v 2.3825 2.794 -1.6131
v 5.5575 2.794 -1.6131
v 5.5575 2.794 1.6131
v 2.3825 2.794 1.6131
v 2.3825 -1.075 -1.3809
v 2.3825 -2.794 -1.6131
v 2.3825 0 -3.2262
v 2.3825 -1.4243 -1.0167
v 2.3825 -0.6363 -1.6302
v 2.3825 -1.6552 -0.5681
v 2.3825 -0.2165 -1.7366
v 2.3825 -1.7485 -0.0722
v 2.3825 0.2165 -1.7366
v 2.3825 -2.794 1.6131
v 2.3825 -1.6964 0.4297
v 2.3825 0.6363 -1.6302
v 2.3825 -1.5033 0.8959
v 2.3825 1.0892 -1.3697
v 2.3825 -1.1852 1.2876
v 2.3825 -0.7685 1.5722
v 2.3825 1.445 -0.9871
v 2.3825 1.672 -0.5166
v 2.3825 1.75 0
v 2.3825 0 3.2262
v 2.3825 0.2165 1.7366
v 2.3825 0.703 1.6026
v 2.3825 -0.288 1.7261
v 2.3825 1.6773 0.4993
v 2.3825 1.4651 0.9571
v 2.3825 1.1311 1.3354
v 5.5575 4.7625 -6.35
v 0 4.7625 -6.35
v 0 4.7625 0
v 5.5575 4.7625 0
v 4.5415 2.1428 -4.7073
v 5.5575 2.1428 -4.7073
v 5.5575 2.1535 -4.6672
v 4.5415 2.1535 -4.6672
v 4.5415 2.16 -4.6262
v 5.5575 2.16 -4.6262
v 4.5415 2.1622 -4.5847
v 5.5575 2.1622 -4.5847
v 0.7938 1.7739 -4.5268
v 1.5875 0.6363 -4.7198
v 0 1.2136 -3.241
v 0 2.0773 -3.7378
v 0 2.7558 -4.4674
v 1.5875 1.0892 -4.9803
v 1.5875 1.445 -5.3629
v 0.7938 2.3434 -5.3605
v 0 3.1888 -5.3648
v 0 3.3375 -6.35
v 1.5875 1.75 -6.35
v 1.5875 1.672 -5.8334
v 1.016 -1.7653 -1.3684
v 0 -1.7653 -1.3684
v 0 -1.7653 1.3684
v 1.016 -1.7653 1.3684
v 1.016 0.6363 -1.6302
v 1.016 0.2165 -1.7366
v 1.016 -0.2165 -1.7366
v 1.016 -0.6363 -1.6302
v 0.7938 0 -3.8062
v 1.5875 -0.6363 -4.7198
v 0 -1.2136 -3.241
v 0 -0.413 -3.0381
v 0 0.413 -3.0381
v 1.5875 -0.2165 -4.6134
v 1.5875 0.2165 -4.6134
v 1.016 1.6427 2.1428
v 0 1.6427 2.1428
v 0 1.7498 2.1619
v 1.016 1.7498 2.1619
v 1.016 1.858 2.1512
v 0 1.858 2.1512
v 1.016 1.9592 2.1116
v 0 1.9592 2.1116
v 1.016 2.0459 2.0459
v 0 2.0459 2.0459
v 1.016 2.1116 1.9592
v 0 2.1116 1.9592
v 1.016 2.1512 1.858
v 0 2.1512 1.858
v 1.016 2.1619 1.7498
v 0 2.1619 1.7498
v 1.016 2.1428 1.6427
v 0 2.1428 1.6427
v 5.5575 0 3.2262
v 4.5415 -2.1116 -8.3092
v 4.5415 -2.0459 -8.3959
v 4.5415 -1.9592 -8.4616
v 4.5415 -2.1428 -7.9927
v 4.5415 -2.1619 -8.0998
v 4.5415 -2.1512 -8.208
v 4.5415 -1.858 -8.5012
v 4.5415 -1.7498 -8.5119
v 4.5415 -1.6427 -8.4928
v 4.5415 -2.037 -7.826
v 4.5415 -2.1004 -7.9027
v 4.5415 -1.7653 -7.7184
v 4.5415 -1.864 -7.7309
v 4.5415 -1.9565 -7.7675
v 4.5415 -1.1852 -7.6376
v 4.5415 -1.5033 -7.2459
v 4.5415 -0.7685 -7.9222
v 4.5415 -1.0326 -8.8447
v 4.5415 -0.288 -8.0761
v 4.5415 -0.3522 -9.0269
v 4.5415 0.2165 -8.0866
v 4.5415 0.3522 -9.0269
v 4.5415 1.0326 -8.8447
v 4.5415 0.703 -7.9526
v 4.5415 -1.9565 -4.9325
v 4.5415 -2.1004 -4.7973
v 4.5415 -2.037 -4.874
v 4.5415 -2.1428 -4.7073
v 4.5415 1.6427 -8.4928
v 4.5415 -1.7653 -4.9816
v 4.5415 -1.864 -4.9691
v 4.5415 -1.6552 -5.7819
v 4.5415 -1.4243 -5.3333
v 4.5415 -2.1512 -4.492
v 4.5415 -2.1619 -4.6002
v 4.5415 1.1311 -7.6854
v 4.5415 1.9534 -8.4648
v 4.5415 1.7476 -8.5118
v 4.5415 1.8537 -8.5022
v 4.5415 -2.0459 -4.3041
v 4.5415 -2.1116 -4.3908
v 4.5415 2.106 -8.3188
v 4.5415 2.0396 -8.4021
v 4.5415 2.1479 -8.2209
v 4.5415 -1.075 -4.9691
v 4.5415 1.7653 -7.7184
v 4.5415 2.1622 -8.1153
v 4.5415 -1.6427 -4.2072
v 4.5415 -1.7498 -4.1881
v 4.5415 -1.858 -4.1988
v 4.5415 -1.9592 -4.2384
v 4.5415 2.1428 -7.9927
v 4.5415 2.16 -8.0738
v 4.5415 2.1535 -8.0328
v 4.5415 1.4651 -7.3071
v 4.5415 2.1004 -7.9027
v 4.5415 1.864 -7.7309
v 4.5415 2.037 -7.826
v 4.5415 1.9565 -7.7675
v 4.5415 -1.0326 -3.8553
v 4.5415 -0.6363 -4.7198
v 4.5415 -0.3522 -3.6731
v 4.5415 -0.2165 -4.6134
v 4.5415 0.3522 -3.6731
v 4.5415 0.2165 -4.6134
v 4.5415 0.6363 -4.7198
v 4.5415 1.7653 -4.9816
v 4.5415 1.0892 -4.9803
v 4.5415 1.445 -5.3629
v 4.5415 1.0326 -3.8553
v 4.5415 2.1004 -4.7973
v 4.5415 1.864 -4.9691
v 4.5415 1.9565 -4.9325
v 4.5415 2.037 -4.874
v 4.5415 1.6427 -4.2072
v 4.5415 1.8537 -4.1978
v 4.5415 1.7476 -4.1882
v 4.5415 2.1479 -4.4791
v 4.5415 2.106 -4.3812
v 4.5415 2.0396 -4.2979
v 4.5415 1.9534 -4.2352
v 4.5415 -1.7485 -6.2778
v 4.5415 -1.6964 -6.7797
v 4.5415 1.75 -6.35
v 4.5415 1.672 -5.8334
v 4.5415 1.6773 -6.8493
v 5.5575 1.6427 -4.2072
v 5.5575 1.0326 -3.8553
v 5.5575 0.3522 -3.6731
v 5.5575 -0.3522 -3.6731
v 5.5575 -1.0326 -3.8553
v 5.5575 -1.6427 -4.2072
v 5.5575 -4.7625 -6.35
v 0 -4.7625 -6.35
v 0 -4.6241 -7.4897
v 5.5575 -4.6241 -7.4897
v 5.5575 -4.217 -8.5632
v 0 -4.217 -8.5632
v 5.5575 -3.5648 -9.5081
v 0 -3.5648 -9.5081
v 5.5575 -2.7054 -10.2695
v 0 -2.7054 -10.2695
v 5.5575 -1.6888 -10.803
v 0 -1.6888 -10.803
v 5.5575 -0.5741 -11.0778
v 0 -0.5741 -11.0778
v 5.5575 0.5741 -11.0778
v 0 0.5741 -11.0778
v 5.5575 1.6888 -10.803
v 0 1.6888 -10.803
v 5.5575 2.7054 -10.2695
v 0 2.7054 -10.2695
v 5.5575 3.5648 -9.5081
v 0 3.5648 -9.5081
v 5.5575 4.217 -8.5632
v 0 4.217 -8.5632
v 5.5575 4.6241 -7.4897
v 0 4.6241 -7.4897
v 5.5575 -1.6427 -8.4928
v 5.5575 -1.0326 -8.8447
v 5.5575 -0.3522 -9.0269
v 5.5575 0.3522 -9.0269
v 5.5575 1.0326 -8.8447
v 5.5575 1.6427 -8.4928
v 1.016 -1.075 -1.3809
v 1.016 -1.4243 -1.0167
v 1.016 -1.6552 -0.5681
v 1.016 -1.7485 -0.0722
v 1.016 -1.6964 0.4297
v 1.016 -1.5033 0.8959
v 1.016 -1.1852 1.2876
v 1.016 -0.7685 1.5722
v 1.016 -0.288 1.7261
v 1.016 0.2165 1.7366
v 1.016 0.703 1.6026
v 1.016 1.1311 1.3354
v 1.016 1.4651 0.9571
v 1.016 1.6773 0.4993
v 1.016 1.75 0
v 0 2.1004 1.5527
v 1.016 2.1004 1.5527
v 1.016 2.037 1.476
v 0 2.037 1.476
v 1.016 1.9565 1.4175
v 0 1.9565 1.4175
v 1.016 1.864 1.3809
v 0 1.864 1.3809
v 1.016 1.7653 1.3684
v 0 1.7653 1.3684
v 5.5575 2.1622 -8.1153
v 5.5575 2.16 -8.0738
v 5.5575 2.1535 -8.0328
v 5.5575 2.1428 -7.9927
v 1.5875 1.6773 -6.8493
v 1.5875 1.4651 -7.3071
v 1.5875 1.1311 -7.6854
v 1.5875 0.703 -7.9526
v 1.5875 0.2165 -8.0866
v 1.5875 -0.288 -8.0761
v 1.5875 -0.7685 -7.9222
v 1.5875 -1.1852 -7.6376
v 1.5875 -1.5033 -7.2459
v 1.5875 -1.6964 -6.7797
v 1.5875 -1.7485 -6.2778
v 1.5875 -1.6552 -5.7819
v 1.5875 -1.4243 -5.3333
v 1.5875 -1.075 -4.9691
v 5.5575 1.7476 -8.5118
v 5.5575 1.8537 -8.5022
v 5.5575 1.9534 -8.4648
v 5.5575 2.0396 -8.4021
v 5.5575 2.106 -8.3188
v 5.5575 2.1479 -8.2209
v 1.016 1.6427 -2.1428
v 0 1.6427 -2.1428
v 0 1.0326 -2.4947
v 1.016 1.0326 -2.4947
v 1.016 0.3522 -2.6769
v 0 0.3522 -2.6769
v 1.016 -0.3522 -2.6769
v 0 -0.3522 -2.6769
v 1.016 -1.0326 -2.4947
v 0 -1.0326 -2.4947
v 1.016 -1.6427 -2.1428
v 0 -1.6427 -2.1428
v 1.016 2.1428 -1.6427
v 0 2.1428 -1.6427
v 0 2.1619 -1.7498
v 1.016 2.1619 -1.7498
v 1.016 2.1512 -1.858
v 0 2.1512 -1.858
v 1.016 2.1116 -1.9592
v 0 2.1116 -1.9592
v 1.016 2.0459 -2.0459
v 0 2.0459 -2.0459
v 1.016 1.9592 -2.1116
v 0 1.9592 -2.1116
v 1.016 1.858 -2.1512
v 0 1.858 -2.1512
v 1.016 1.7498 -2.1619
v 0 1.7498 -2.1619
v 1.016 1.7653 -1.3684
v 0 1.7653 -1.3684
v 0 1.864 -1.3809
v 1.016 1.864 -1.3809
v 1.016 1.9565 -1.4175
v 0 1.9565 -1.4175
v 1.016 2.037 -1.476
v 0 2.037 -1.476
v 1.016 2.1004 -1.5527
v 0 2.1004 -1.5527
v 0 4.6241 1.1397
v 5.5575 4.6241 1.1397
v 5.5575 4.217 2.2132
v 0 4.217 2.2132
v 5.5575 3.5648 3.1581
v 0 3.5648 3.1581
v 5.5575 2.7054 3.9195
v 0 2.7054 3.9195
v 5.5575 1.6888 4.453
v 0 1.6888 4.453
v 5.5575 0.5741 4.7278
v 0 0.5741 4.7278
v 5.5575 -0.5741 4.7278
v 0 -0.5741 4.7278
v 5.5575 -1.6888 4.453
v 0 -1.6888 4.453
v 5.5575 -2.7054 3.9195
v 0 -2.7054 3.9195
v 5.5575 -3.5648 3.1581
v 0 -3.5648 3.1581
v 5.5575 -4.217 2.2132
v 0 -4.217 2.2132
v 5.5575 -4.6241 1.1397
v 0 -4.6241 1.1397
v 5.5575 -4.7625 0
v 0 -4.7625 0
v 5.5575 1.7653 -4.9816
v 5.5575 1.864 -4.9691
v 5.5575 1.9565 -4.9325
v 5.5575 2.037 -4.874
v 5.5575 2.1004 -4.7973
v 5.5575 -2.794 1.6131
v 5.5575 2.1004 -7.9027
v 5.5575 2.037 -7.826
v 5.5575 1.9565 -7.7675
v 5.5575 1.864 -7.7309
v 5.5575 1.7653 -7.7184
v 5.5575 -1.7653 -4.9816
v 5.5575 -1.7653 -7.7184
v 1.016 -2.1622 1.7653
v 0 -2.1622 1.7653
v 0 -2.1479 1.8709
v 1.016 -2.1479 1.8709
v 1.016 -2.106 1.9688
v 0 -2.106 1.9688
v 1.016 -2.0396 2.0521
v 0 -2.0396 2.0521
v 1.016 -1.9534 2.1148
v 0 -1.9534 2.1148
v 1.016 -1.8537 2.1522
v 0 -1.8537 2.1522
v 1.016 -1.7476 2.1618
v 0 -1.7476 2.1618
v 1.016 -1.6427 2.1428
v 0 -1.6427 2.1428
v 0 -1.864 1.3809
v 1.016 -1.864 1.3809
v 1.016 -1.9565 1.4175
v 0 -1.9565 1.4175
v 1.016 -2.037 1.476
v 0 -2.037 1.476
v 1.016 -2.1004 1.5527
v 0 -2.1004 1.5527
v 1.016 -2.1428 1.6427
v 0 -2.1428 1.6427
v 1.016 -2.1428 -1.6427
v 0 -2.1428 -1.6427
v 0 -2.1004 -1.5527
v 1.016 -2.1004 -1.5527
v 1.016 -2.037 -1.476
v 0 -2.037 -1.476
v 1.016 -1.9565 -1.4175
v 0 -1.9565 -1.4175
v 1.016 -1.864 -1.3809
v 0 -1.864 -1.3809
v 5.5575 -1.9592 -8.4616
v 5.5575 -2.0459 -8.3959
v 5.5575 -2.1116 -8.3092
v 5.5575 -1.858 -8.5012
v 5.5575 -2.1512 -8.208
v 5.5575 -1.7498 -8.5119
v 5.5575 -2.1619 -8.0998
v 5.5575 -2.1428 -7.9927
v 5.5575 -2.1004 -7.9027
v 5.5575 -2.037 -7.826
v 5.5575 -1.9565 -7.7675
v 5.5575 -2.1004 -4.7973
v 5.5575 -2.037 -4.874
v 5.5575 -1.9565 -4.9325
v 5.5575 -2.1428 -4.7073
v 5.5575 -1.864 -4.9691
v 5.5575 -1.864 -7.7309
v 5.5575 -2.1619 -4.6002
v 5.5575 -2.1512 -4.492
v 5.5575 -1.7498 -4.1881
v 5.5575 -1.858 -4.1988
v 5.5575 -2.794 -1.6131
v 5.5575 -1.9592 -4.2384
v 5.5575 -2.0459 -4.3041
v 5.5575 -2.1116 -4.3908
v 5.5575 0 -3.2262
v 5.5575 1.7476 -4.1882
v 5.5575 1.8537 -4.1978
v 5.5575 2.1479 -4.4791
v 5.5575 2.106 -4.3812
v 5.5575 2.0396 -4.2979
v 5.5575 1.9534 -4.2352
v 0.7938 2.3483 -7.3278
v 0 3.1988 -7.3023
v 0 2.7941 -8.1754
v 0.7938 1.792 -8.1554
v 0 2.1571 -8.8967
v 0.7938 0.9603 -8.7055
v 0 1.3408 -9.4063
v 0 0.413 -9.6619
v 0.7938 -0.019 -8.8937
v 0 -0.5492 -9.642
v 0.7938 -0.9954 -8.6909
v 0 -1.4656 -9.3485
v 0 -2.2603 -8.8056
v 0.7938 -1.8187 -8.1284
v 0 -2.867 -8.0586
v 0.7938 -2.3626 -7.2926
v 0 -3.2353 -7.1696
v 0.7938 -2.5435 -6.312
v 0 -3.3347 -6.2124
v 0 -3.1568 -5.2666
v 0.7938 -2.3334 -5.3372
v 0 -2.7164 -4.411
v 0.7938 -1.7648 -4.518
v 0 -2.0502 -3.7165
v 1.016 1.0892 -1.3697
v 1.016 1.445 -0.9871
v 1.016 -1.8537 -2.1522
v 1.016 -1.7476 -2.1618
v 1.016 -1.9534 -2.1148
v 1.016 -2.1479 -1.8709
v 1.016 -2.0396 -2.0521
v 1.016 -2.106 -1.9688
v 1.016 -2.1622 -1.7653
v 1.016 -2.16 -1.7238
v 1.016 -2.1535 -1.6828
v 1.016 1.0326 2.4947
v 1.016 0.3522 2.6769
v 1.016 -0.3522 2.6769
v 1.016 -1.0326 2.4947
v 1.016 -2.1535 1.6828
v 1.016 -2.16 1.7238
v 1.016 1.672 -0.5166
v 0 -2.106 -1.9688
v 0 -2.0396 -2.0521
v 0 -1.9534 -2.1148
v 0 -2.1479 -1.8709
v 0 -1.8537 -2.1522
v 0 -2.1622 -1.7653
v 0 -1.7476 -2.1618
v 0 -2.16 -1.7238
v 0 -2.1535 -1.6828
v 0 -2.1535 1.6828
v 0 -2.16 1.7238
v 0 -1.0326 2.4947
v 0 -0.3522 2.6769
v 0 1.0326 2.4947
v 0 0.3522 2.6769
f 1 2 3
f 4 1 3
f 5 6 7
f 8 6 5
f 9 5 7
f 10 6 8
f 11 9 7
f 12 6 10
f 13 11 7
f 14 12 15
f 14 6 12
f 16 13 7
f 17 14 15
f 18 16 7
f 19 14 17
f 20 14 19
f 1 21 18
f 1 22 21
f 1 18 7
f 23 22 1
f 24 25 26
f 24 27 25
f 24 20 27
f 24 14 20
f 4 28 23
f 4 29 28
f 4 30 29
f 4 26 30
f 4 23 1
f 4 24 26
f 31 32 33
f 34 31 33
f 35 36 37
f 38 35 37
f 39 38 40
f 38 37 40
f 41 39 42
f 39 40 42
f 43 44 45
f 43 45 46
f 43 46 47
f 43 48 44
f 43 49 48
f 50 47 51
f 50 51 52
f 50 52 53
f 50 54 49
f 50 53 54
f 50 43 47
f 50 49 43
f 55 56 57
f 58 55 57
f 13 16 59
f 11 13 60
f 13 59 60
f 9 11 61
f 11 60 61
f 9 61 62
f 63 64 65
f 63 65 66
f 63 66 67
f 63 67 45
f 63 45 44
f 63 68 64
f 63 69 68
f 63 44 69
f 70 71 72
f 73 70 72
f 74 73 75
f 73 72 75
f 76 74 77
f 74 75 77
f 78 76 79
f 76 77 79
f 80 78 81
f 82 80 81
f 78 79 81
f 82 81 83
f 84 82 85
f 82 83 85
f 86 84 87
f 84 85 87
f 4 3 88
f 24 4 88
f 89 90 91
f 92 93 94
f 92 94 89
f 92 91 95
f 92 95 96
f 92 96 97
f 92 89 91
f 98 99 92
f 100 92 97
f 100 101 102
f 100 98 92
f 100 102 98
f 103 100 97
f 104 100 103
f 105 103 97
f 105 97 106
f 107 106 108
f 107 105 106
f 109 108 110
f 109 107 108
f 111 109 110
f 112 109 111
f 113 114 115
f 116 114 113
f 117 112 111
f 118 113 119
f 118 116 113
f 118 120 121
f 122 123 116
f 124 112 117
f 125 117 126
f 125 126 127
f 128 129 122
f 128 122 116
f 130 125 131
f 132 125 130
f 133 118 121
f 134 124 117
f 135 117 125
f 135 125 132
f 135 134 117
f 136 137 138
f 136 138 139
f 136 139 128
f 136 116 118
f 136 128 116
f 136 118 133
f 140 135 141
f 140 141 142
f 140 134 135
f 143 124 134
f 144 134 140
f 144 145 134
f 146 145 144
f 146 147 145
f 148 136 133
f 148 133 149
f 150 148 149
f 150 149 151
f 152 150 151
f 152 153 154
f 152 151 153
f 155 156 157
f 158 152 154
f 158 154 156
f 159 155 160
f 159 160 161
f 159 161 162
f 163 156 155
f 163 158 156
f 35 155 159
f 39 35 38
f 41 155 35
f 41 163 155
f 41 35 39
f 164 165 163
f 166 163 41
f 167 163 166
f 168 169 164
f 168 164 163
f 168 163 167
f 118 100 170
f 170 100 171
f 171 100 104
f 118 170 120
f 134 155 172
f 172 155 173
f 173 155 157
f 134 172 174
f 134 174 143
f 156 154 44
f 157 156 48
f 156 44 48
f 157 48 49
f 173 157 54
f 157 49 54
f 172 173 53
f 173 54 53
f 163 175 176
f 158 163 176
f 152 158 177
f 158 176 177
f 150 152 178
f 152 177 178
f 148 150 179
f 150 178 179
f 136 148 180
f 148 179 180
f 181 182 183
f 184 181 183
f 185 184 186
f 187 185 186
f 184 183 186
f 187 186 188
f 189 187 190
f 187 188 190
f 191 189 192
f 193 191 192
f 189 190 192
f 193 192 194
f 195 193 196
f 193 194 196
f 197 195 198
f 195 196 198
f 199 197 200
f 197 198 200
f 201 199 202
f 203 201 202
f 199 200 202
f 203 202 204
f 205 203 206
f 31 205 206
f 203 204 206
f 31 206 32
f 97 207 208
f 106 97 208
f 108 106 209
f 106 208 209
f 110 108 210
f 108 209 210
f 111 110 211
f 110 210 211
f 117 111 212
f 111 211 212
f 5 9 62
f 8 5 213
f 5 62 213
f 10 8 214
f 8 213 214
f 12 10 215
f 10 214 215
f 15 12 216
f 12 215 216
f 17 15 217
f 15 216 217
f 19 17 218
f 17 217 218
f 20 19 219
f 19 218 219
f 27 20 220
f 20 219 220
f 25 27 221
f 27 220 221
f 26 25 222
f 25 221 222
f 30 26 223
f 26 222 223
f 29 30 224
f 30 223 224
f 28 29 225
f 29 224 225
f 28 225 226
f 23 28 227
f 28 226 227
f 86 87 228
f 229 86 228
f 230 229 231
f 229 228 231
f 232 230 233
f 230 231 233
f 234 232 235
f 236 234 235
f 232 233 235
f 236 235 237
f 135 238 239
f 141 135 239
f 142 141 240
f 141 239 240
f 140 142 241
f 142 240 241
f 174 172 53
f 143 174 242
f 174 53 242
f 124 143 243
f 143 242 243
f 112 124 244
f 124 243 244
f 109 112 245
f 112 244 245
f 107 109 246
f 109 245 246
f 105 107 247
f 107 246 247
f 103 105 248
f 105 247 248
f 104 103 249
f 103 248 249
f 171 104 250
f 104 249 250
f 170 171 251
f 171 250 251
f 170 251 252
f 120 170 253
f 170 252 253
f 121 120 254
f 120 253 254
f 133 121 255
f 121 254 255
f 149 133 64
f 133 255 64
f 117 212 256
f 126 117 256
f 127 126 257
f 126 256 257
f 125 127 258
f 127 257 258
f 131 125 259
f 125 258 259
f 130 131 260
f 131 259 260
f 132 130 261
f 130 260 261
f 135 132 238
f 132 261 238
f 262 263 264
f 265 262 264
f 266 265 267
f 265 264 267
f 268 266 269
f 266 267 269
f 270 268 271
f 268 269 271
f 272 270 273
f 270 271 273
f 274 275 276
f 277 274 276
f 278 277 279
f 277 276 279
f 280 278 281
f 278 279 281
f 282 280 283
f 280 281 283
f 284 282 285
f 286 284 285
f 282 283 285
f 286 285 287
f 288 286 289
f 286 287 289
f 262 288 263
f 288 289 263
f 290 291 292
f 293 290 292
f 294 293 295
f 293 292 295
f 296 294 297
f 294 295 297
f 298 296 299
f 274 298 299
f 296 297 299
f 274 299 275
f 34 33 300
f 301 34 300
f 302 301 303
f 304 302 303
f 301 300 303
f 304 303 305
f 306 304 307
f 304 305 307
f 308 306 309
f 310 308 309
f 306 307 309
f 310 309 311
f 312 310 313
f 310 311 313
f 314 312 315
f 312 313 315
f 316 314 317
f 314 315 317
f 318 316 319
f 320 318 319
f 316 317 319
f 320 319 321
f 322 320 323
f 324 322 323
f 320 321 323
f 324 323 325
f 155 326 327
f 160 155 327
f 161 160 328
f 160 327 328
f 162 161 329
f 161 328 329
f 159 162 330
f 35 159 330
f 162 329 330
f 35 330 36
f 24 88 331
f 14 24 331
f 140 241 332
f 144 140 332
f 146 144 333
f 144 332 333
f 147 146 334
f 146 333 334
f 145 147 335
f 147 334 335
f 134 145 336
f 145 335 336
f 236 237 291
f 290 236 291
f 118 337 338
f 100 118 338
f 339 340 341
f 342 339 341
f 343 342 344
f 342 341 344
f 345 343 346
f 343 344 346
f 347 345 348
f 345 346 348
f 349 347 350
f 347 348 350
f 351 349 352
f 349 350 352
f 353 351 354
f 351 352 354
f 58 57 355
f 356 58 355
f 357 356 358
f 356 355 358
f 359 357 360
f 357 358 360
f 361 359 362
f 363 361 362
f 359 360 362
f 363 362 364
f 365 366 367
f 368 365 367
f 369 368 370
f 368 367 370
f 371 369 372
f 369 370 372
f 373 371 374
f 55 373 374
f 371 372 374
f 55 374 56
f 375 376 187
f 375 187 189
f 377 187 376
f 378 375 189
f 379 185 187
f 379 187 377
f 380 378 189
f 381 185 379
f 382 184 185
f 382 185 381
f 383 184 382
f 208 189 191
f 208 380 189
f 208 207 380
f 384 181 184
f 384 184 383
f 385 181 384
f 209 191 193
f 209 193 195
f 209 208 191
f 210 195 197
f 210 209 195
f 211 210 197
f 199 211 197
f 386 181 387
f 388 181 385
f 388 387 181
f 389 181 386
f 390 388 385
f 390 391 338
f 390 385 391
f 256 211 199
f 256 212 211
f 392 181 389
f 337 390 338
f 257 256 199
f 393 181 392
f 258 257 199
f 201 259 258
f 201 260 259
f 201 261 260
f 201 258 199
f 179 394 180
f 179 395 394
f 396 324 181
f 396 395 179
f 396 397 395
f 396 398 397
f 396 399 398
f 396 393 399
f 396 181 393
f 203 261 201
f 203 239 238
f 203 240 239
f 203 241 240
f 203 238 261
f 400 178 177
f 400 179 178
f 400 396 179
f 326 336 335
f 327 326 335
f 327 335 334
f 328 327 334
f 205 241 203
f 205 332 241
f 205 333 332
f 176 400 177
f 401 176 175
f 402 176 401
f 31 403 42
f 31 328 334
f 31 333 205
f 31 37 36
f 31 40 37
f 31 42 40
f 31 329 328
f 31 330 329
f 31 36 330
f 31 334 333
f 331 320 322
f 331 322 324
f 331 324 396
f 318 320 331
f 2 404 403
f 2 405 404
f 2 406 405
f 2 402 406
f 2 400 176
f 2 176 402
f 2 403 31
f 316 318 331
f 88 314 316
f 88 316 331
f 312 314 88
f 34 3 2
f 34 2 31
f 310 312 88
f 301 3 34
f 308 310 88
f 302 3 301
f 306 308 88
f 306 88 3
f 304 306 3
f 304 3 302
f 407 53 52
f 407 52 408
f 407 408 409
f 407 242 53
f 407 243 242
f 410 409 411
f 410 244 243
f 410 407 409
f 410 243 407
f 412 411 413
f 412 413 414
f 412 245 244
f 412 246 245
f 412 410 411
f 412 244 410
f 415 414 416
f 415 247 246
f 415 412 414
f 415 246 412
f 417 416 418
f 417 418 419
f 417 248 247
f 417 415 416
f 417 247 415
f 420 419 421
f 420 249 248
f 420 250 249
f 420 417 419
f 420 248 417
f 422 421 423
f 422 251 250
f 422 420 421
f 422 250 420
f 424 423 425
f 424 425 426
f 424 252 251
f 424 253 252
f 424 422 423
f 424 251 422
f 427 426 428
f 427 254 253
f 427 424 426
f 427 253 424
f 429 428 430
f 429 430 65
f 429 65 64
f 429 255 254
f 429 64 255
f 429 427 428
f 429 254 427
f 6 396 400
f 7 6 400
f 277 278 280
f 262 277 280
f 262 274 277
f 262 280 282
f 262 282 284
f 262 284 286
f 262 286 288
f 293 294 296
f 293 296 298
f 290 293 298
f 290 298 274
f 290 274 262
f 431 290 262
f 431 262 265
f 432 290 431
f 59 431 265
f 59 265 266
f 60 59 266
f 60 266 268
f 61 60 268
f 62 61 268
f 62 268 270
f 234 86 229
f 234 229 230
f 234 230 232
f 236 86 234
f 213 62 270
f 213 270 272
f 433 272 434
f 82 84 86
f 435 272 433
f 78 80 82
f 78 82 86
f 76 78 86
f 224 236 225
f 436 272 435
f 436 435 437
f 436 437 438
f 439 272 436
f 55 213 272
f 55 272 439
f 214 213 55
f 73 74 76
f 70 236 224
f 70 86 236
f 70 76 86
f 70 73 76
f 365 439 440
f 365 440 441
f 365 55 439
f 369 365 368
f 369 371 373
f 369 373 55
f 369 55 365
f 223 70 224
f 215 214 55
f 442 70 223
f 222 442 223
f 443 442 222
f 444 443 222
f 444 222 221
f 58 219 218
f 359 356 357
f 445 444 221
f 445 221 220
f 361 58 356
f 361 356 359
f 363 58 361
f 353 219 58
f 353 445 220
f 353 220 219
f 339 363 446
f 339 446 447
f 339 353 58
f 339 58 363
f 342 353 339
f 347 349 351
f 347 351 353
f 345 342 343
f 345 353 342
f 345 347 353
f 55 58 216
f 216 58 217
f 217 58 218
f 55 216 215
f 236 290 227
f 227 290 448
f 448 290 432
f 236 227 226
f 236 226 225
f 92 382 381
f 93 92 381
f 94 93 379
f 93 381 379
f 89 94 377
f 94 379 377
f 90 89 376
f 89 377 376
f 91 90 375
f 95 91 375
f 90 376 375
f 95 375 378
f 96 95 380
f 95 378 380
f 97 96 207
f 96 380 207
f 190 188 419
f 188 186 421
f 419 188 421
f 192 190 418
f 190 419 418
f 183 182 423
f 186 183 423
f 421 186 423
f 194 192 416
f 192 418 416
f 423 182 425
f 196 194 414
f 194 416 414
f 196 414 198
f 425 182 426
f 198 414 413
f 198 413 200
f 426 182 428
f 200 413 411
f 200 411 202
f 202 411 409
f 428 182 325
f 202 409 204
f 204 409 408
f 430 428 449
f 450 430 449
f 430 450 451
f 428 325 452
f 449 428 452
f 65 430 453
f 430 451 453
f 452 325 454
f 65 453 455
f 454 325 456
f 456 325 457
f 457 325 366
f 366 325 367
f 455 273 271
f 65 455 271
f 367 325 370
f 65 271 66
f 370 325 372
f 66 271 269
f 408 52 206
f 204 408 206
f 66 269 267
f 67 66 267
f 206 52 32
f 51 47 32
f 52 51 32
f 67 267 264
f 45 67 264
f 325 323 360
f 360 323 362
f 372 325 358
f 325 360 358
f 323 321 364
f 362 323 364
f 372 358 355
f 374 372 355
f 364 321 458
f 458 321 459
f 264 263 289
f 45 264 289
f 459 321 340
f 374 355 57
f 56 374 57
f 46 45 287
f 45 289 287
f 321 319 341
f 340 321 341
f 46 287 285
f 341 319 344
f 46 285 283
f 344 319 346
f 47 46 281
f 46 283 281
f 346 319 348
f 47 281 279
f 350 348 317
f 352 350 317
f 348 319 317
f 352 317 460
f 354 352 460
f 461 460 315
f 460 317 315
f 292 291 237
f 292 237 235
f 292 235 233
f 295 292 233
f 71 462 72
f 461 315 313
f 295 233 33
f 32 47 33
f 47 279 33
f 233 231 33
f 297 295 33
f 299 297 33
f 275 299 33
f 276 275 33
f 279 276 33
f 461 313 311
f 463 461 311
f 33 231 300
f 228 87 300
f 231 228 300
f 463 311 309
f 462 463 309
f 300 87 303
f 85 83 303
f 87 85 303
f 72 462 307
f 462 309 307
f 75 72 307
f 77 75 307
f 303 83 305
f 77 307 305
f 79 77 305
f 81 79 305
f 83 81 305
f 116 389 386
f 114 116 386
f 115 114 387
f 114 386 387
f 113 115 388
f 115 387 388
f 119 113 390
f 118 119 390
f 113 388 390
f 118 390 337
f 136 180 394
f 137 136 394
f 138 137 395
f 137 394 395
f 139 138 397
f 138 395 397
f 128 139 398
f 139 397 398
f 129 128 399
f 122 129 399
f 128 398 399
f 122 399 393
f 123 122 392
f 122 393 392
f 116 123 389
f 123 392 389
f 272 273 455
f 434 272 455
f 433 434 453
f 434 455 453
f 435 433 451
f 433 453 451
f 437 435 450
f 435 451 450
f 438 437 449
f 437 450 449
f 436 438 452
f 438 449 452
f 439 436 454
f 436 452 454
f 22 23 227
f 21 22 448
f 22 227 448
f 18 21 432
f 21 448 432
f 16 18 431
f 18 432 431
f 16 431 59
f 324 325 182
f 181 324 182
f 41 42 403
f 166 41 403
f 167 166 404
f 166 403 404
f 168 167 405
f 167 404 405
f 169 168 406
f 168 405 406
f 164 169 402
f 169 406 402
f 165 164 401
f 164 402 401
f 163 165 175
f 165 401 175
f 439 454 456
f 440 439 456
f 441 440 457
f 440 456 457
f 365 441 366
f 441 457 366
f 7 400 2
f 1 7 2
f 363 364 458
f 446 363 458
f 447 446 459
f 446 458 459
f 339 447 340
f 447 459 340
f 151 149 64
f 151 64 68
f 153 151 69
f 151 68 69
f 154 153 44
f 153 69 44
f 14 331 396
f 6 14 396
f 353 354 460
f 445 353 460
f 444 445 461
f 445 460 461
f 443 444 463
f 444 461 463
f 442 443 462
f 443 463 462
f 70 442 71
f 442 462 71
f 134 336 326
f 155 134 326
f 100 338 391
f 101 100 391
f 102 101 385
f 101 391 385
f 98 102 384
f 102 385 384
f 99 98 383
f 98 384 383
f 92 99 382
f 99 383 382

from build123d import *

# Parameters (mm, degrees)
F1_DEPTH = 5.55752
F2_R     = 1.75
F3_DEPTH = 1.016
F4_R     = 1.75
F5_DEPTH = 1.016
F6_DEPTH = 3.175
F7_SIZE  = 1.5875


# Not quite as in the source:
# - a feature names something its author has since deleted; it is built from what else it names


with BuildPart() as f1:
    # F0 (on Right) → F1 (new body)
    with BuildSketch(Plane.YZ):
        with BuildLine():
            ThreePointArc((0.636344373, -4.7197957677), (2.2310225415, -4.2076055743), (3.5497579143, -3.175))
            ThreePointArc((3.5497579143, -3.175), (2.2310225415, -2.1423944257), (0.636344373, -1.6302042323))
            ThreePointArc((0.636344373, -1.6302042323), (0, -1.75), (-0.636344373, -1.6302042323))
            ThreePointArc((-0.636344373, -1.6302042323), (-2.2310225415, -2.1423944257), (-3.5497579143, -3.175))
            ThreePointArc((-3.5497579143, -3.175), (-2.2310225415, -4.2076055743), (-0.636344373, -4.7197957677))
            ThreePointArc((-0.636344373, -4.7197957677), (0, -4.6), (0.636344373, -4.7197957677))
        make_face()
        with BuildLine():
            ThreePointArc((3.5497579143, -3.175), (4.4489958596, -1.6993652025), (4.7625, 0))
            ThreePointArc((4.7625, 0), (0, 4.7625), (-4.7625, 0))
            ThreePointArc((-4.7625, 0), (-4.4489958596, -1.6993652025), (-3.5497579143, -3.175))
            ThreePointArc((-3.5497579143, -3.175), (-2.2310225415, -2.1423944257), (-0.636344373, -1.6302042323))
            ThreePointArc((-0.636344373, -1.6302042323), (-0.9871416685, 1.4450091094), (1.75, 0))
            ThreePointArc((1.75, 0), (1.4450091094, -0.9871416685), (0.636344373, -1.6302042323))
            ThreePointArc((0.636344373, -1.6302042323), (2.2310225415, -2.1423944257), (3.5497579143, -3.175))
        make_face()
        with BuildLine():
            Line((4.7625, -6.35), (4.7625, 0))
            ThreePointArc((4.7625, 0), (4.4489958596, -1.6993652025), (3.5497579143, -3.175))
            ThreePointArc((3.5497579143, -3.175), (4.4489958596, -4.6506347975), (4.7625, -6.35))
        make_face()
        with BuildLine():
            ThreePointArc((4.7625, -6.35), (4.4489958596, -4.6506347975), (3.5497579143, -3.175))
            ThreePointArc((3.5497579143, -3.175), (2.2310225415, -4.2076055743), (0.636344373, -4.7197957677))
            ThreePointArc((0.636344373, -4.7197957677), (1.4450091094, -5.3628583315), (1.75, -6.35))
            ThreePointArc((1.75, -6.35), (-0.9871416685, -7.7950091094), (-0.636344373, -4.7197957677))
            ThreePointArc((-0.636344373, -4.7197957677), (-2.2310225415, -4.2076055743), (-3.5497579143, -3.175))
            ThreePointArc((-3.5497579143, -3.175), (-4.4489958596, -4.6506347975), (-4.7625, -6.35))
            ThreePointArc((-4.7625, -6.35), (0, -11.1125), (4.7625, -6.35))
        make_face()
        with BuildLine():
            ThreePointArc((-3.5497579143, -3.175), (-4.4489958596, -1.6993652025), (-4.7625, 0))
            Line((-4.7625, 0), (-4.7625, -6.35))
            ThreePointArc((-4.7625, -6.35), (-4.4489958596, -4.6506347975), (-3.5497579143, -3.175))
        make_face()
    extrude(amount=F1_DEPTH)

    # F2 (on face) → F3 (cut)
    with BuildSketch(Plane.YZ.offset(5.55752)):
        with BuildLine():
            ThreePointArc((1.368425, -4.5847), (1.4846669962, -4.8653330038), (1.7653, -4.981575))
            Line((1.7653, -4.981575), (1.7653, -4.5847))
            Line((1.7653, -4.5847), (1.368425, -4.5847))
        make_face()
        with BuildLine():
            Line((1.7653, -4.5847), (1.7653, -4.981575))
            ThreePointArc((1.7653, -4.981575), (1.9986038099, -4.9057593371), (2.1427708235, -4.7072787218))
            ThreePointArc((2.1427708235, -4.7072787218), (1.9091883092, -4.4408116908), (1.6427212782, -4.2072291765))
            ThreePointArc((1.6427212782, -4.2072291765), (1.4442406629, -4.3513961901), (1.368425, -4.5847))
            Line((1.368425, -4.5847), (1.7653, -4.5847))
        make_face()
        with BuildLine():
            ThreePointArc((1.7653, -7.718425), (1.4846669962, -7.8346669962), (1.368425, -8.1153))
            Line((1.368425, -8.1153), (1.7653, -8.1153))
            Line((1.7653, -8.1153), (1.7653, -7.718425))
        make_face()
        with BuildLine():
            Line((1.7653, -8.1153), (1.368425, -8.1153))
            ThreePointArc((1.368425, -8.1153), (1.4442406629, -8.3486038099), (1.6427212782, -8.4927708235))
            ThreePointArc((1.6427212782, -8.4927708235), (1.9091883092, -8.2591883092), (2.1427708235, -7.9927212782))
            ThreePointArc((2.1427708235, -7.9927212782), (1.9986038099, -7.7942406629), (1.7653, -7.718425))
            Line((1.7653, -7.718425), (1.7653, -8.1153))
        make_face()
        with BuildLine():
            Line((-1.368425, -8.1153), (-1.7653, -8.1153))
            Line((-1.7653, -8.1153), (-1.7653, -7.718425))
            ThreePointArc((-1.7653, -7.718425), (-1.9986038099, -7.7942406629), (-2.1427708235, -7.9927212782))
            ThreePointArc((-2.1427708235, -7.9927212782), (-1.9091883092, -8.2591883092), (-1.6427212782, -8.4927708235))
            ThreePointArc((-1.6427212782, -8.4927708235), (-1.4442406629, -8.3486038099), (-1.368425, -8.1153))
        make_face()
        with BuildLine():
            Line((-1.7653, -7.718425), (-1.7653, -8.1153))
            Line((-1.7653, -8.1153), (-1.368425, -8.1153))
            ThreePointArc((-1.368425, -8.1153), (-1.4846669962, -7.8346669962), (-1.7653, -7.718425))
        make_face()
        with BuildLine():
            Line((-1.7653, -4.5847), (-1.7653, -4.981575))
            ThreePointArc((-1.7653, -4.981575), (-1.4846669962, -4.8653330038), (-1.368425, -4.5847))
            Line((-1.368425, -4.5847), (-1.7653, -4.5847))
        make_face()
        with BuildLine():
            ThreePointArc((-2.1427708235, -4.7072787218), (-1.9986038099, -4.9057593371), (-1.7653, -4.981575))
            Line((-1.7653, -4.981575), (-1.7653, -4.5847))
            Line((-1.7653, -4.5847), (-1.368425, -4.5847))
            ThreePointArc((-1.368425, -4.5847), (-1.4442406629, -4.3513961901), (-1.6427212782, -4.2072291765))
            ThreePointArc((-1.6427212782, -4.2072291765), (-1.9091883092, -4.4408116908), (-2.1427708235, -4.7072787218))
        make_face()
        with BuildLine():
            ThreePointArc((-1.7653, -7.718425), (-1.4846669962, -7.8346669962), (-1.368425, -8.1153))
            Line((-1.368425, -8.1153), (1.368425, -8.1153))
            ThreePointArc((1.368425, -8.1153), (1.4846669962, -7.8346669962), (1.7653, -7.718425))
            Line((1.7653, -7.718425), (1.7653, -4.981575))
            ThreePointArc((1.7653, -4.981575), (1.4846669962, -4.8653330038), (1.368425, -4.5847))
            Line((1.368425, -4.5847), (-1.368425, -4.5847))
            ThreePointArc((-1.368425, -4.5847), (-1.4846669962, -4.8653330038), (-1.7653, -4.981575))
            Line((-1.7653, -4.981575), (-1.7653, -7.718425))
        make_face()
        with Locations((0, -6.35)):
            Circle(F2_R, mode=Mode.SUBTRACT)
        with BuildLine():
            ThreePointArc((-1.6427212782, -4.2072291765), (-2.0459330038, -4.3040669962), (-2.1427708235, -4.7072787218))
            ThreePointArc((-2.1427708235, -4.7072787218), (-1.9091883092, -4.4408116908), (-1.6427212782, -4.2072291765))
        make_face()
        with BuildLine():
            ThreePointArc((1.6427212782, -4.2072291765), (1.9091883092, -4.4408116908), (2.1427708235, -4.7072787218))
            ThreePointArc((2.1427708235, -4.7072787218), (2.1572939405, -4.6467525283), (2.162175, -4.5847))
            ThreePointArc((2.162175, -4.5847), (1.9986038099, -4.2636406629), (1.6427212782, -4.2072291765))
        make_face()
        with BuildLine():
            ThreePointArc((2.1427708235, -7.9927212782), (1.9091883092, -8.2591883092), (1.6427212782, -8.4927708235))
            ThreePointArc((1.6427212782, -8.4927708235), (1.9986038099, -8.4363593371), (2.162175, -8.1153))
            ThreePointArc((2.162175, -8.1153), (2.1572939405, -8.0532474717), (2.1427708235, -7.9927212782))
        make_face()
        with BuildLine():
            ThreePointArc((-2.1427708235, -7.9927212782), (-2.0459330038, -8.3959330038), (-1.6427212782, -8.4927708235))
            ThreePointArc((-1.6427212782, -8.4927708235), (-1.9091883092, -8.2591883092), (-2.1427708235, -7.9927212782))
        make_face()
        with BuildLine():
            ThreePointArc((-1.6427212782, -4.2072291765), (-1.4442406629, -4.3513961901), (-1.368425, -4.5847))
            Line((-1.368425, -4.5847), (1.368425, -4.5847))
            ThreePointArc((1.368425, -4.5847), (1.4442406629, -4.3513961901), (1.6427212782, -4.2072291765))
            ThreePointArc((1.6427212782, -4.2072291765), (0, -3.65), (-1.6427212782, -4.2072291765))
        make_face()
        with BuildLine():
            Line((1.368425, -8.1153), (-1.368425, -8.1153))
            ThreePointArc((-1.368425, -8.1153), (-1.4442406629, -8.3486038099), (-1.6427212782, -8.4927708235))
            ThreePointArc((-1.6427212782, -8.4927708235), (0, -9.05), (1.6427212782, -8.4927708235))
            ThreePointArc((1.6427212782, -8.4927708235), (1.4442406629, -8.3486038099), (1.368425, -8.1153))
        make_face()
    extrude(amount=-F3_DEPTH, mode=Mode.SUBTRACT)

    # F4 (on face) → F5 (cut)
    with BuildSketch(Plane(origin=(0, 0, 0), x_dir=(0, -1, 0), z_dir=(-1, 0, 0))):
        with BuildLine():
            ThreePointArc((1.7653, -1.368425), (1.4846669962, -1.4846669962), (1.368425, -1.7653))
            Line((1.368425, -1.7653), (1.7653, -1.7653))
            Line((1.7653, -1.7653), (1.7653, -1.368425))
        make_face()
        with BuildLine():
            Line((1.7653, -1.7653), (1.368425, -1.7653))
            ThreePointArc((1.368425, -1.7653), (1.4442406629, -1.9986038099), (1.6427212782, -2.1427708235))
            ThreePointArc((1.6427212782, -2.1427708235), (1.9091883092, -1.9091883092), (2.1427708235, -1.6427212782))
            ThreePointArc((2.1427708235, -1.6427212782), (1.9986038099, -1.4442406629), (1.7653, -1.368425))
            Line((1.7653, -1.368425), (1.7653, -1.7653))
        make_face()
        with BuildLine():
            Line((-1.7653, -1.368425), (-1.7653, -1.7653))
            Line((-1.7653, -1.7653), (-1.368425, -1.7653))
            ThreePointArc((-1.368425, -1.7653), (-1.4846669962, -1.4846669962), (-1.7653, -1.368425))
        make_face()
        with BuildLine():
            Line((-1.368425, -1.7653), (-1.7653, -1.7653))
            Line((-1.7653, -1.7653), (-1.7653, -1.368425))
            ThreePointArc((-1.7653, -1.368425), (-1.9986038099, -1.4442406629), (-2.1427708235, -1.6427212782))
            ThreePointArc((-2.1427708235, -1.6427212782), (-1.9091883092, -1.9091883092), (-1.6427212782, -2.1427708235))
            ThreePointArc((-1.6427212782, -2.1427708235), (-1.4442406629, -1.9986038099), (-1.368425, -1.7653))
        make_face()
        with BuildLine():
            Line((-1.7653, 1.7653), (-1.7653, 1.368425))
            ThreePointArc((-1.7653, 1.368425), (-1.4846669962, 1.4846669962), (-1.368425, 1.7653))
            Line((-1.368425, 1.7653), (-1.7653, 1.7653))
        make_face()
        with BuildLine():
            ThreePointArc((-2.1427708235, 1.6427212782), (-1.9986038099, 1.4442406629), (-1.7653, 1.368425))
            Line((-1.7653, 1.368425), (-1.7653, 1.7653))
            Line((-1.7653, 1.7653), (-1.368425, 1.7653))
            ThreePointArc((-1.368425, 1.7653), (-1.4442406629, 1.9986038099), (-1.6427212782, 2.1427708235))
            ThreePointArc((-1.6427212782, 2.1427708235), (-1.9091883092, 1.9091883092), (-2.1427708235, 1.6427212782))
        make_face()
        with BuildLine():
            ThreePointArc((1.368425, 1.7653), (1.4846669962, 1.4846669962), (1.7653, 1.368425))
            Line((1.7653, 1.368425), (1.7653, 1.7653))
            Line((1.7653, 1.7653), (1.368425, 1.7653))
        make_face()
        with BuildLine():
            Line((1.7653, 1.7653), (1.7653, 1.368425))
            ThreePointArc((1.7653, 1.368425), (1.9986038099, 1.4442406629), (2.1427708235, 1.6427212782))
            ThreePointArc((2.1427708235, 1.6427212782), (1.9091883092, 1.9091883092), (1.6427212782, 2.1427708235))
            ThreePointArc((1.6427212782, 2.1427708235), (1.4442406629, 1.9986038099), (1.368425, 1.7653))
            Line((1.368425, 1.7653), (1.7653, 1.7653))
        make_face()
        with BuildLine():
            ThreePointArc((-1.7653, -1.368425), (-1.4846669962, -1.4846669962), (-1.368425, -1.7653))
            Line((-1.368425, -1.7653), (1.368425, -1.7653))
            ThreePointArc((1.368425, -1.7653), (1.4846669962, -1.4846669962), (1.7653, -1.368425))
            Line((1.7653, -1.368425), (1.7653, 1.368425))
            ThreePointArc((1.7653, 1.368425), (1.4846669962, 1.4846669962), (1.368425, 1.7653))
            Line((1.368425, 1.7653), (-1.368425, 1.7653))
            ThreePointArc((-1.368425, 1.7653), (-1.4846669962, 1.4846669962), (-1.7653, 1.368425))
            Line((-1.7653, 1.368425), (-1.7653, -1.368425))
        make_face()
        Circle(F4_R, mode=Mode.SUBTRACT)
        with BuildLine():
            ThreePointArc((-1.6427212782, 2.1427708235), (-2.0459330038, 2.0459330038), (-2.1427708235, 1.6427212782))
            ThreePointArc((-2.1427708235, 1.6427212782), (-1.9091883092, 1.9091883092), (-1.6427212782, 2.1427708235))
        make_face()
        with BuildLine():
            ThreePointArc((-2.1427708235, -1.6427212782), (-2.0459330038, -2.0459330038), (-1.6427212782, -2.1427708235))
            ThreePointArc((-1.6427212782, -2.1427708235), (-1.9091883092, -1.9091883092), (-2.1427708235, -1.6427212782))
        make_face()
        with BuildLine():
            ThreePointArc((2.1427708235, -1.6427212782), (1.9091883092, -1.9091883092), (1.6427212782, -2.1427708235))
            ThreePointArc((1.6427212782, -2.1427708235), (1.9986038099, -2.0863593371), (2.162175, -1.7653))
            ThreePointArc((2.162175, -1.7653), (2.1572939405, -1.7032474717), (2.1427708235, -1.6427212782))
        make_face()
        with BuildLine():
            ThreePointArc((1.6427212782, 2.1427708235), (1.9091883092, 1.9091883092), (2.1427708235, 1.6427212782))
            ThreePointArc((2.1427708235, 1.6427212782), (2.1572939405, 1.7032474717), (2.162175, 1.7653))
            ThreePointArc((2.162175, 1.7653), (1.9986038099, 2.0863593371), (1.6427212782, 2.1427708235))
        make_face()
        with BuildLine():
            ThreePointArc((-1.6427212782, 2.1427708235), (-1.4442406629, 1.9986038099), (-1.368425, 1.7653))
            Line((-1.368425, 1.7653), (1.368425, 1.7653))
            ThreePointArc((1.368425, 1.7653), (1.4442406629, 1.9986038099), (1.6427212782, 2.1427708235))
            ThreePointArc((1.6427212782, 2.1427708235), (0, 2.7), (-1.6427212782, 2.1427708235))
        make_face()
        with BuildLine():
            Line((1.368425, -1.7653), (-1.368425, -1.7653))
            ThreePointArc((-1.368425, -1.7653), (-1.4442406629, -1.9986038099), (-1.6427212782, -2.1427708235))
            ThreePointArc((-1.6427212782, -2.1427708235), (0, -2.7), (1.6427212782, -2.1427708235))
            ThreePointArc((1.6427212782, -2.1427708235), (1.4442406629, -1.9986038099), (1.368425, -1.7653))
        make_face()
    extrude(amount=-F5_DEPTH, mode=Mode.SUBTRACT)

    # F2 (on face) → F6 (cut)
    with BuildSketch(Plane.YZ.offset(5.55752)):
        Polygon((-2.794, -1.6131166521), (0, -3.2262333042), (2.794, -1.6131166521), (2.794, 1.6131166521), (0, 3.2262333042), (-2.794, 1.6131166521), align=None)
        Circle(F2_R, mode=Mode.SUBTRACT)
    extrude(amount=-F6_DEPTH, mode=Mode.SUBTRACT)

    # F7
    f7_edges = [f1.edges().sort_by_distance(p)[0] for p in [
        (0, -0.636344, -7.980204),
    ]]
    chamfer(f7_edges, length=F7_SIZE)


solid = f1.part
